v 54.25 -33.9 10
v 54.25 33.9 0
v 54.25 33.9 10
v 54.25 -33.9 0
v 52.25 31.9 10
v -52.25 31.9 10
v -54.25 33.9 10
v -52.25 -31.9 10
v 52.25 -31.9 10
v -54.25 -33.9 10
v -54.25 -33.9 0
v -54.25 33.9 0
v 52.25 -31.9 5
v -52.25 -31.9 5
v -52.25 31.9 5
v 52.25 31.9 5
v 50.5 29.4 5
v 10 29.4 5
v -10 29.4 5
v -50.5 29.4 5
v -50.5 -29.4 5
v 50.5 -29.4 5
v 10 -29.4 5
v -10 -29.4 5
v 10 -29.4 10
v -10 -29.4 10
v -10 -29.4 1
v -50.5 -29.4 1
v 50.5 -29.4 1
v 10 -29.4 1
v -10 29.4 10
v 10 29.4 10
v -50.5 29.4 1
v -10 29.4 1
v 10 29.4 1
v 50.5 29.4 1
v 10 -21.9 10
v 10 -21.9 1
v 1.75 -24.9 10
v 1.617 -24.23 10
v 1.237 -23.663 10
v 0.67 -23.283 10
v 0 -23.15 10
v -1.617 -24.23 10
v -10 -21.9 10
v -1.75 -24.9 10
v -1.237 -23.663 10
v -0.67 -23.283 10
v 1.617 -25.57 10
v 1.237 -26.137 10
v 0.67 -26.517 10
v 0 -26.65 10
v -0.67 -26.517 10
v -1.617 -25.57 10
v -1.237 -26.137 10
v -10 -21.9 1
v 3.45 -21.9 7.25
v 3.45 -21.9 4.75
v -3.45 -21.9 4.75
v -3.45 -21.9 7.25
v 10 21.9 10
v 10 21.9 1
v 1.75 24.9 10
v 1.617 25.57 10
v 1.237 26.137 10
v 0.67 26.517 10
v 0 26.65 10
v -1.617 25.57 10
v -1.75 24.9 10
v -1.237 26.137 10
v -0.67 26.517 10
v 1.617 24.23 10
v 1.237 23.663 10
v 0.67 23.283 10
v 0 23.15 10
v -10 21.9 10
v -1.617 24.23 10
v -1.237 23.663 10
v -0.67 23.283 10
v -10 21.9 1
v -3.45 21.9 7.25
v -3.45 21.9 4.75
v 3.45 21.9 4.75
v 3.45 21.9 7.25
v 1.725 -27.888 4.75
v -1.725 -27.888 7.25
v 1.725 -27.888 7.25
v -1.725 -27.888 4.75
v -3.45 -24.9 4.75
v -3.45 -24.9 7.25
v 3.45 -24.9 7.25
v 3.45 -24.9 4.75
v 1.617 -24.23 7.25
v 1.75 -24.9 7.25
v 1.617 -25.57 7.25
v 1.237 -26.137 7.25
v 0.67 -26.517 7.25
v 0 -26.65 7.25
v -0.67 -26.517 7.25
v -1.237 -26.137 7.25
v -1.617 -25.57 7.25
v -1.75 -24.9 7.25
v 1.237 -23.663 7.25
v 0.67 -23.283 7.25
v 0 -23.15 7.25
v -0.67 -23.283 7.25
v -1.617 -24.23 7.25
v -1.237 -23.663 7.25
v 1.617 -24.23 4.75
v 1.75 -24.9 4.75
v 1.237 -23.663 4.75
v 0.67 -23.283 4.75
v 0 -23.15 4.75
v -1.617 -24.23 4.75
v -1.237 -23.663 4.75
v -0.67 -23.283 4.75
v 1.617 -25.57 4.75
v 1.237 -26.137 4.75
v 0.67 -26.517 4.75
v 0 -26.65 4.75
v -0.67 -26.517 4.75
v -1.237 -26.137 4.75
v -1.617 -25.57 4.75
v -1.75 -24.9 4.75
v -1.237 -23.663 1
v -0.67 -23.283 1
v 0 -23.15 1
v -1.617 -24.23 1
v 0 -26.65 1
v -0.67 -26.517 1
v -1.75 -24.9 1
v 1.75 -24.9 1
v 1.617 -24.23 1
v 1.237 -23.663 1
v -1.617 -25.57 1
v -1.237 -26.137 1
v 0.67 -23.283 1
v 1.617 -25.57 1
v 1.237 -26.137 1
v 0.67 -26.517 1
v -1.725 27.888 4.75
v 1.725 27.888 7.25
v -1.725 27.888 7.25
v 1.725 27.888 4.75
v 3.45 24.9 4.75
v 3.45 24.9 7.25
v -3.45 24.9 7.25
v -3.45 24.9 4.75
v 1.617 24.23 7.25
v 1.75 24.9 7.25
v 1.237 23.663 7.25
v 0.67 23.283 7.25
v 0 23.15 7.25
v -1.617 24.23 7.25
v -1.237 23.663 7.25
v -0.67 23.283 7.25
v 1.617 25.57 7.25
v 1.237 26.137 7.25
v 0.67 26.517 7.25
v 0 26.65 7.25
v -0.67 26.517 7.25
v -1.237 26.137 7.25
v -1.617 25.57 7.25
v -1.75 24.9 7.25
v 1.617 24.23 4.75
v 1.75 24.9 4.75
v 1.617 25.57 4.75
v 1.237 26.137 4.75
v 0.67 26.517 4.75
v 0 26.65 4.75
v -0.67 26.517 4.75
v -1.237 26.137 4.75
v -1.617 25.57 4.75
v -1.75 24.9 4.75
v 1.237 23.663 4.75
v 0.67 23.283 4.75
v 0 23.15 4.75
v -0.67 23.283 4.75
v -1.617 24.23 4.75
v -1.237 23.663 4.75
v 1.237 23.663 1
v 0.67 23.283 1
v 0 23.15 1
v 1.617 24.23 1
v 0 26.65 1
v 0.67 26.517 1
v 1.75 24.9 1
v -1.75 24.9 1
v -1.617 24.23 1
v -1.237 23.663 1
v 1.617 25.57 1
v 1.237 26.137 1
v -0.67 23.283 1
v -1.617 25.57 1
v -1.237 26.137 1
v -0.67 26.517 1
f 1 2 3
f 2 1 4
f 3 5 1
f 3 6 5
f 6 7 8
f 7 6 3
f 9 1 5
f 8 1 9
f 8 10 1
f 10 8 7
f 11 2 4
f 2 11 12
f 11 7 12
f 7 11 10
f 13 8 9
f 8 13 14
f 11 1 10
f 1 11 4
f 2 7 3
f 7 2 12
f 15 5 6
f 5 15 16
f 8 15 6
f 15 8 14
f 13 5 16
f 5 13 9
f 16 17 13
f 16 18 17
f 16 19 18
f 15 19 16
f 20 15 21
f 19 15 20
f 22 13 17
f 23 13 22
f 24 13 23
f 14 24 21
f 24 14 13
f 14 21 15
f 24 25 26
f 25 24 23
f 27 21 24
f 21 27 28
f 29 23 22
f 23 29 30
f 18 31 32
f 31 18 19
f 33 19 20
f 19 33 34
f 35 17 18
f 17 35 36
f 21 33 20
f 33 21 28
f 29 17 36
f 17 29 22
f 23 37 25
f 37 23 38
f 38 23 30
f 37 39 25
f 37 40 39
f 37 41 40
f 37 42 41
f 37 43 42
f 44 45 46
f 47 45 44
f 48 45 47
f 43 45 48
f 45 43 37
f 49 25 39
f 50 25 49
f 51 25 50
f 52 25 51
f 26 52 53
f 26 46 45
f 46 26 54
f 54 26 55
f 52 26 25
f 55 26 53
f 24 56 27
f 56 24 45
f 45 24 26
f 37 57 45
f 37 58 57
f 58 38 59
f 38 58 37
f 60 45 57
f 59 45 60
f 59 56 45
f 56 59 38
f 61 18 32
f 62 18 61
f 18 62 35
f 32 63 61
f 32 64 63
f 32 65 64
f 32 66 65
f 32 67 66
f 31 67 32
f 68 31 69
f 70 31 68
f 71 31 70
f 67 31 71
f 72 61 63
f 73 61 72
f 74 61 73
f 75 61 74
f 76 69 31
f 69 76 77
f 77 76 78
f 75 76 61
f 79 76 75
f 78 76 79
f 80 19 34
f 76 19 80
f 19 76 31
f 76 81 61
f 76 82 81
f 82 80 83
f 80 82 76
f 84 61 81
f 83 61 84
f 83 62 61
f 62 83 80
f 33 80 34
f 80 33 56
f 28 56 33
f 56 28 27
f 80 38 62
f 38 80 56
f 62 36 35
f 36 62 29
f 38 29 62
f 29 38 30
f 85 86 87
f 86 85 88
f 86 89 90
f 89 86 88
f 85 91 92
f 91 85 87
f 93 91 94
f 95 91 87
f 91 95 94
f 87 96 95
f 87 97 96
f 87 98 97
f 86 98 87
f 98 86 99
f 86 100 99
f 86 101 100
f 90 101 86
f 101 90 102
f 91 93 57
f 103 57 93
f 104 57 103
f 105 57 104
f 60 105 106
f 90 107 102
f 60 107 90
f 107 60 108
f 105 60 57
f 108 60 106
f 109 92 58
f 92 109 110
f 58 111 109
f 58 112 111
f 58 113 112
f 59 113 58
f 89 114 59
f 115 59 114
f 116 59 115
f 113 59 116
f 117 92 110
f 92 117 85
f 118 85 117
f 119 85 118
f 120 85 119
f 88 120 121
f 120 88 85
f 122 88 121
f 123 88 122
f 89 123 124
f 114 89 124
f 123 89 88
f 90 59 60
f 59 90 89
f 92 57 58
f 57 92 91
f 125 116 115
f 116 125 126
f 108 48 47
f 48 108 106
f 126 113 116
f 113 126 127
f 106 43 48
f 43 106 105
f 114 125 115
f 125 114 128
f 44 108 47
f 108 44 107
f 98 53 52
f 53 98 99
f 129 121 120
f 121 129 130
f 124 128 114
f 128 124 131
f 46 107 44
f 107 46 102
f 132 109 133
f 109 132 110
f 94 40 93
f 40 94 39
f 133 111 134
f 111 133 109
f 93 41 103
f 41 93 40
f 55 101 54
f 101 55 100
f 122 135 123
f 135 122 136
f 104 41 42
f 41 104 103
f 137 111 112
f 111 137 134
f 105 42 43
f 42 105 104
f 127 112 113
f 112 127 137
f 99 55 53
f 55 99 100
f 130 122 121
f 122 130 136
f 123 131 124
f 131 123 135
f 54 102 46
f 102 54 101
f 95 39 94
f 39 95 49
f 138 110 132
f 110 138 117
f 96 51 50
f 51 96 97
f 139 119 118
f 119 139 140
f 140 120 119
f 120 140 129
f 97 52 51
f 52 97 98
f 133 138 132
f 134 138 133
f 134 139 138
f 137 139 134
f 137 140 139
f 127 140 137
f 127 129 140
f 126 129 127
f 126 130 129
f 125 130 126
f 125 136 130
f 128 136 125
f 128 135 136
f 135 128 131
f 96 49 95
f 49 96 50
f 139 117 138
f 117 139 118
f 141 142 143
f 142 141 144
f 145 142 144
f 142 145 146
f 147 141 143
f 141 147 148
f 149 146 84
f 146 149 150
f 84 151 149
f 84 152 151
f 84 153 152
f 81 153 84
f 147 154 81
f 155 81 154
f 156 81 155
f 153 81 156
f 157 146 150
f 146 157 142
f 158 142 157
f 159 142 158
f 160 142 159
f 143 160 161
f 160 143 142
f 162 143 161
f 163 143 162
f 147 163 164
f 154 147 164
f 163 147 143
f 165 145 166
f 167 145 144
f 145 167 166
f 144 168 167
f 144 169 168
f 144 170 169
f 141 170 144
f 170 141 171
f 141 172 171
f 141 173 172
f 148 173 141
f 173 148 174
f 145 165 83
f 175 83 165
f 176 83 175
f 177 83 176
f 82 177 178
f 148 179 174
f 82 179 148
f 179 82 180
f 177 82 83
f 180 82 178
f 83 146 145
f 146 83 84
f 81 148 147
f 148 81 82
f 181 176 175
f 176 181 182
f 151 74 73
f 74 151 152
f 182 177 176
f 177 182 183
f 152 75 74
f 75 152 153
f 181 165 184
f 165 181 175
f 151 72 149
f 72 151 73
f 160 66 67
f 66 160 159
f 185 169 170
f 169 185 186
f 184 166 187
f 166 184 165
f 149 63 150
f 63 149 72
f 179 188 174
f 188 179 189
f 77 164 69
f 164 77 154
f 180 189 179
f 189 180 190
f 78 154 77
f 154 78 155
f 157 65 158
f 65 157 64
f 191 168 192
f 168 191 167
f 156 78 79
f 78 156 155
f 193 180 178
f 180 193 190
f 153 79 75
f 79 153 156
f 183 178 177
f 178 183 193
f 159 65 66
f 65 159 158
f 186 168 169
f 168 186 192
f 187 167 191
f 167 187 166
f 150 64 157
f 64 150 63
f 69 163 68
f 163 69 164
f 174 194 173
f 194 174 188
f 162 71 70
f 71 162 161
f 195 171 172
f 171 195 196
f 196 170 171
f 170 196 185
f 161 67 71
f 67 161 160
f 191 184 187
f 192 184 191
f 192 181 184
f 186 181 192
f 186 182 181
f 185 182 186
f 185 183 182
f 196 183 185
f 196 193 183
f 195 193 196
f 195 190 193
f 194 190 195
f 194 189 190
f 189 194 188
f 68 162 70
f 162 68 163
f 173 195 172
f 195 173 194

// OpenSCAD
// file: ../library/din41612/din41612_male_dim.scad
include <../linurs/linurs_screw_dim.scad>

// connector dimensions
din41612_male_l=94.5;    // lenght of the connector
din41612_male_l1=87.5;   // 
din41612_male_w=13;      // width of the connector
din41612_male_w1=6.4;    // 
din41612_male_w2=5.6;    // 
din41612_male_h=11;      // height of the connector
din41612_male_h1=1.6;    // 
din41612_male_h2=6;      // 

din41612_male_dl=88.9;   // distance between mounting holes
// file: ../library/din41612/din41612_female_dim.scad
include <../linurs/linurs_screw_dim.scad>

// connector dimensions
din41612_female_l=95;       // lenght of the connector
din41612_female_l1=85;      // lenght of the connector head
din41612_female_h=11.6;     // height of the connector
din41612_female_h1=5.2;     // height produced by the connector when pulgged in 
din41612_female_w=11;       // width of the connector
din41612_female_w1=8.5;     // width of the connector head

din41612_female_dl=90;      // distance between mounting holes
// file: ../motherboard/motherboard_dim.scad
include <../library/linurs/linurs_screw_dim.scad>
include <../library/din41612/din41612_female_dim.scad>
include <../library/din41612/din41612_male_dim.scad>
include <../pcb/pcb_dim.scad>
// motherboard pcb dimensions
motherboard_l=pcb_l;   // pcb width
motherboard_h=1.6;     // pcb thickness
step=25.4;             // distance between modules

function motherboard_w(n)=din41612_female_w+step*(n-1);

screw_motherboard_d=M2_5;
screw_motherboard_l=16;
motherboard_pass=0.5;// gap to fit screws 

motherboard_z_offset=-din41612_male_w1-din41612_female_h1-motherboard_h;
// file: ../pcb/pcb_dim.scad
// The pcb is the master object of the project
// therefore no other include files from other objects
// are necessary

// pcb constants
pcb_l =100;  // lenght of the pcb
pcb_ld = 94; // hole distance 
pcb_w=80;    // height of the pcb
pcb_wd = 67; // hole distance
pcb_wd1 = 9; // hole to edge distance 
pcb_d=3;     // diameter of holes
pcb_h=1.6;   // thickness
// file: ../bracket/bracket_dim.scad
// bracket

include <../pcb/pcb_dim.scad>
include <../motherboard/motherboard_dim.scad>
include <../library/linurs/linurs_screw_dim.scad>

bracket_screw=M2_5;   // hole for the screw

bracket_gap=0.5;      // gap between bracket to make sure it fits in the box
bracket_screw_gap=0.5;// gap to fit the screw

bracket_l=pcb_w+15;   // height of bracket
bracket_l1=19;        // hole l
bracket_l2=3*screw_d[bracket_screw];
bracket_ld=pcb_wd;    // hole distance

bracket_h=10;         // depth of the U shape at the side of the screw
bracket_h1=4;         // depth of the U shape at the side where no screw is 
bracket_h2=2-bracket_gap/2;   // thickness of bracket
bracket_h3=5;         // hole h

bracket_w1=4;         // height of the mounting hole cube
bracket_tn=2;         // thickness of bracket
bracket_t=bracket_tn-bracket_gap/2;  // thickness of bracket - gap

bracket_offset_z=-10;  // bracket offset in elecbox z axis

function bracket_w(n)=step*n-bracket_gap;
function bracket_w2(n)=step*n-2*bracket_tn;
// file: ../wall/wall_dim.scad
include <../module/module_dim.scad>

wall_foot_l=8;
wall_foot_w=8;

wall_screw_gap=0.5;// gap to fit the screw
wall_d1=M3;
wall_d2=M3;

wall_l=module_l;
wall_l1=pcb_l;
wall_l2=module_l1;
wall_l3=pcb_l-2*wall_foot_l;
wall_l4=96;
wall_l5=20;
wall_ld=pcb_l-wall_foot_l;

wall_w=module_h+wall_foot_w;
wall_w1=wall_foot_w;
wall_w2=5;
wall_w3=5;
wall_w4=75;
wall_w5=13;
wall_wd=15;

wall_h=6.5;        // wall outside thickness
wall_h1=10;
wall_h2=2;
wall_h3=1;
wall_hd1=7;
wall_hd2=3;

wall_vent_n=20;
wall_lv=94;
wall_wv1=26;
wall_wv2=20;
wall_vent_x=1.5;
wall_vent_x2=wall_lv/(wall_vent_n-1);
// file: ../module/module_dim.scad
include <../bracket/bracket_dim.scad>

module_l=pcb_l+2*bracket_h2+bracket_gap;
module_l1=module_l-2*bracket_h1;
module_h=bracket_l;

function module_w(n)=bracket_w(n);
// file: ../library/linurs/linurs_screw.scad
// Metric screws and nuts 
// urs@linurs.org 2019
// It is targeted for 3D printing applications. 
// To look realistic is not the goal (Example: Nuts do not have a hole)

include <linurs_screw_dim.scad>

d=0; //[0:M2_5,1:M3,2:M4,3:M5]
type=0;//[0:head_cyl,1:head_cnt,2:head_no,3:head_hex]
w=15; 
i=10;
nut_sink=0;
screw_sink=0; 
t=0.01;
fn=16;

/* [hex_bolt] */
show_hex_bolt=false;

/* [nut] */
show_nut=false;

/* [screw] */
show_screw=false;

/* [screw_fix] */
show_screw_fix=false;

/* [screw_cut] */
show_screw_cut=false;

/* [nut_cut] */
show_nut_cut=false;
wi=0; 
rot=false;

// functions used multiple times to position nuts and heads
function headh_cyl(d)=screw_cyl[d][1];  // height of cyl screw head
function headh_cnt(d)=screw_cyl[d][1];  // height of cnt screw head
function headh(d,type=head_cyl)=(type==head_cyl ? headh_cyl(d) : (type==head_cnt ? headh_cnt(d) : 0 )); // height of screw head 

function nuth(d)=screw_hex[d][2];   // height of hex nut

// head of a cylinder screw
module screw_head_cyl(d=M3, t=0)
{
  screwhd=screw_cyl[d][0]+t; // diameter of cylinder screw head
  cylinder(d=screwhd,h=headh(d=d, type=head_cyl), center=true,$fn=16); // screw head
}

// head of a countersunk screw
module screw_head_cnt(d=M3, t=0)
{
  screwd=screw_d[d]+t; 
  screwhd=screw_cnt[d][0]+t; // diameter of cylinder screw head
  cylinder(d1=screwd,d2=screwhd,h=headh(d=d,type=head_cnt), center=true,$fn=16); // screw head
}

// head of a hex screw
module screw_head_hex(d=M3, t=0)
{
    translate([0,0,-nuth(d)/2])nut(d=d, t=t);
}

// head of all screws
module screw_head(d=M3, type=head_cyl, t=0)
{ 
  if(type==head_cnt){
    screw_head_cnt(d=d, t=t);
  } else {
    if(type==head_cyl){
      screw_head_cyl(d=d, t=t);
    } else {
       if(type==head_hex){
           screw_head_hex(d=d, t=t); 
       } 
    }    
  }
}

// hex bolt 
module hex_bolt(d=M3, w=10, t=0)
{
  nutd=screw_hex[d][1]+t; // outer diameter of hex bolt
  cylinder(r=nutd/2,h=w+t, center=true,$fn=6); // nut
}

// nut 
module nut(d=M3, t=0)
{
  hex_bolt(d=d, w=nuth(d), t=t);    
}

// screw 
// w outer width of the screw = screw length + head 
module screw(w=10, d=M3, type=head_cyl, t=0){
  screwd=screw_d[d]+t;       // screw diameter
  cylinder(d=screwd, h=w, center=true,$fn=16); // screw thread length
  translate([0,0,w/2-headh(d=d,type=type)/2])
  screw_head(d=d,type=type, t=t);
}

// screw fix
// w outer width of the screw = screw length + head 
// sink additional material below to remove 
// raise additional material above to remove
module screw_fix(w=10, d=M3, type=head_cyl, screw_sink=0, nut_sink=0, t=0){
  screw(w=w, d=d, type=type, t=t);
  translate([0,0,-w/2+nuth(d)/2])
    nut(d=d,t=t);
  //additional material to be removed above the nut  
  translate([0,0,-(w+nut_sink)/2])hex_bolt(d=d,w=nut_sink+0.01,t=t);    
  //additional material to be removed above the screw head
  if(type==head_cnt){  
    translate([0,0,w/2+screw_sink])
    cylinder(d=screw_cnt[d][0]+t,h=screw_sink+0.01,center=true,$fn=16);
  }else{ 
    translate([0,0,(w+screw_sink)/2])
    cylinder(d=screw_cyl[d][0]+t,h=screw_sink+0.01,center=true,$fn=16);
  }     
}

// screw cut
// material to be extracted from object to slide in a counter sunk screw for fixation
// w height of the cut out
// i depth of the screw
module screw_cut(d=M3,w=20,i=10,t=0,fn=32){
    hsh=screw_cnt[d][1];
    ws=screw_cnt[d][0]+t;
    ds=screw_d[d]+t;
    
    translate([i/2,0,-(w-hsh)/2])
      cube([i,ws,hsh],center=true);
    
    translate([0,0,-(w-hsh)/2])
      cylinder(d=ws,h=hsh,center=true,$fn=32);
    
    translate([0,0,-(w-hsh)/2+hsh])
        cylinder(d2=ds, d1=ws, h=hsh,center=true,$fn=fn);
    
    cylinder(h=w, d=ds, center=true, $fn=fn);   
    
    translate([i/2,0,0]) 
        cube([i,ds,w],center=true);
    
    for(y=[-1,1]){
        translate([i/2,y*ds/2,-w/2+hsh])
            rotate([45,0,0])
            cube([i,sqrt(2)*(ws-ds)/2,sqrt(2)*(ws-ds)/2],center=true);
    }
}
//screw_cut();

// nut cut
// material to be extracted from object to slide in a nut for fixation
// w height of the cylinder
// i lenght of the inlet
module nut_cut(w=10, wi=0, d=M3, i=10, t=0, rot=false,type=head_cyl){ 
  r=(rot)?90:0;
  ds=(rot)?screw_hex[d][1]:screw_hex[d][0];
  rotate([0,0,r])nut(d,t);
  translate([i/2,0,0])
    cube([i,ds+t,nuth(d)+t],center=true);
  translate([0,0,-wi])
      if(type==head_cnt){    
          screw(w=w, d=d, type=type, t=t); 
        translate([0,0,w/2])
          cylinder(d=screw_cnt[d][0]+t,h=raise,center=true,$fn=16);
      }
      else{ 
          screw(w=w, d=d, type=type, t=t);   
  //      translate([0,0,0])
          //#cylinder(d=screw_cyl[d][0]+t,h=w,center=true,$fn=16);
      }       
}

if(show_hex_bolt==true){
   hex_bolt(d=d, w=w, t=t);
}

if(show_nut==true){
  nut(d=d, t=t);
}    

if(show_screw==true){
   screw(w=w, d=d, type=type, t=t);
}

if(show_screw_fix==true){
  screw_fix(w=w, d=d, type=type, nut_sink=nut_sink, screw_sink=screw_sink, t=t);
}

if(show_screw_cut==true){
  screw_cut(d=d,w=w,i=i,t=t,$fn=fn);
}    

if(show_nut_cut==true){
  nut_cut(w=w, wi=wi, d=d, i=i, t=t,rot=rot,type=type);
}  
// file: head_dim.scad
include <../module/module_dim.scad>
include <../wall/wall_dim.scad>

head_gap=0.5;

head_l1=2;
head_l2=head_l1+bracket_h2;
head_l3=wall_l5;
head_l=module_l+head_gap+2*head_l1;

head_w1=2;
head_w2=head_w1+wall_h2+head_gap;
head_w3=wall_h1-wall_h2-head_gap;
function head_w(n)=module_w(n)+head_gap+2*head_w1+2*wall_h;

head_h2=1;
head_h1=head_h2+4;
head_h=wall_w2+head_h1;
// file: ../elecx_dim.scad
// elecx
// =====

// branding text
branding="ELECX"; // As hole printable name
// file: ../library/linurs/linurs_screw_dim.scad
// Metric screws and nuts 
// urs@linurs.org

// contains dimensions of linurs_screw and can be included in other 
// OpenScad files 

// Parameters in this file
// d screw diameter M2_5, M3, ... (enumeration with screw_d)
// t millimeters added to diameters 

// enumerations of metric threads
M2_5=0;
M3=1;
M4=2;
M5=3;

// enumerations screw head type
head_cyl=0; // cylinder
head_cnt=1; // countrsunk
head_no=2;  // no head at all
head_hex=3;  // no head at all

// screw diameters
screw_d=[
2.5, // M2.5
3.0, // M3
4.0, // M4
5.0  // M5
];

// sizes for hex nuts
screw_hex=[
//   s,   e,   h
 [ 5.0, 5.8, 1.7], // M2.5
 [ 5.5, 6.4, 2.0], // M3
 [ 7.0, 8.1, 2.8], // M4
 [ 8.0, 9.2, 3.5]  // M5
];

// sizes for cylinder screw heads
screw_cyl=[
//   d,   h
 [ 4.5, 1.6], // M2.5
 [ 5.5, 2.0], // M3
 [ 7.0, 2.6], // M4
 [ 8.5, 3.3]  // M5
];

// sizes for countersunk screw heads
screw_cnt=[
//   d,   h
 [ 4.7, 1.50], // M2.5
 [ 5.6, 1.65], // M3
 [ 7.4, 2.20], // M4
 [ 9.2, 2.50]  // M5
];
// main file
// head
// ====
// the head of the elecx

// Variables for customizer
n=2;              // [1,2,3,4,5,6,7,8]
show="default";   // ["default","2d","xcut","ycut","print"]
vent=false;
head_vent_x=2;
head_vent_y=6;
head_vent_n=7;
brand=false;

include <../library/linurs/linurs_screw_dim.scad>
include <../elecx_dim.scad>
include <head_dim.scad>

use <../library/linurs/linurs_screw.scad>

module head(n=1,vent=0, brand=0, top=0){
    echo("head");
    difference(){
        union(){// adding material
            translate([0,0,head_h2/2])
            cube([head_l,head_w(n),head_h2],center=true);  // head top
            
            for(i=[-1,1]){
                translate([0,i*(head_w(n)-head_w1)/2,head_h/2])
                cube([head_l,head_w1,head_h],center=true); // y side walls
            }
            
            for(i=[-1,1]){
                translate([i*(head_l-head_l1)/2,0,head_h/2])
                cube([head_l1,head_w(n),head_h],center=true); // x side walls
            }
            
            for(i=[-1,1]){
                translate([0,i*(head_w(n)-head_w2)/2,head_h1/2])
                cube([head_l,head_w2,head_h1],center=true); // y side walls stand
            }
            
            for(i=[-1,1]){
                translate([i*(head_l-head_l2)/2,0,head_h1/2])
                cube([head_l2,head_w(n),head_h1],center=true); // x side walls stand
            }       
          
            for(i=[-1,1]){
                translate([0,i*((head_w(n)-head_w3)/2-head_w2),head_h/2])
                cube([head_l3,head_w3,head_h],center=true); // wall fixation
            }       
        }// removing material 
        for(i=[-1,1]){
            translate([0,
                       i*(head_w(n)/2-head_w1-wall_hd1),
                       head_h/2+head_h2])
            rotate([0,0,i*-90])
            nut_cut(w=head_h, 
                    wi=0, 
                    d=wall_d1, 
                    i=head_w3, 
                    t=head_gap,
                    rot=true,
                    type=head_no);
        }       

        if(vent==true){
          head_lv_start=head_l3/2+head_vent_x/2;
          head_lv_stop=head_l/2-head_l2-head_vent_x/2;
            
          for(k=[-1,1]){  
              for(j=[0:head_vent_n]){
                 x=k*(head_lv_start+j*(head_lv_stop-head_lv_start)/head_vent_n);
                 for(i=[0:n-1]){
                   y=i*step-(n-1)*step/2;  
                   translate([x,y,0])
                    cube([head_vent_x,
                           step-head_vent_y,
                           2*head_h],center=true);
                }
              }
          }
        }
        
        if(brand==true){         
         translate([0,0,head_h1/2])
         rotate([0,180,90])
         linear_extrude(height = head_h1 ) {
         text(branding, 
             font = "Liberation Sans:style=Bold Italic",
             halign = "center",
             valign = "center",
             size=10);
         }
        }        
    }        
}

if(show=="default"){
     head(n=n, vent=vent, brand=brand);
}

if(show=="print"){
   head(n=n, vent=vent, brand=brand);
}

if(show=="2d"){
  rotate([0,180,0])
     translate([-50,-21,-85])
     head(n=n, vent=vent, brand=brand);
}

if(show=="xcut"){
  difference(){ 
   rotate([0,180,0])
     translate([-50,-21,-85])
       head(n=n, vent=vent, brand=brand);
    translate([-100,0,-50])
      cube([200,100,100]);  
  }    
}

if(show=="ycut"){
  difference(){ 
    rotate([0,180,0])
     translate([-50,-21,-85])
       head(n=n, vent=vent, brand=brand);
    translate([-100,-100,-50])
      cube([100,200,100]);  
  }    
}
